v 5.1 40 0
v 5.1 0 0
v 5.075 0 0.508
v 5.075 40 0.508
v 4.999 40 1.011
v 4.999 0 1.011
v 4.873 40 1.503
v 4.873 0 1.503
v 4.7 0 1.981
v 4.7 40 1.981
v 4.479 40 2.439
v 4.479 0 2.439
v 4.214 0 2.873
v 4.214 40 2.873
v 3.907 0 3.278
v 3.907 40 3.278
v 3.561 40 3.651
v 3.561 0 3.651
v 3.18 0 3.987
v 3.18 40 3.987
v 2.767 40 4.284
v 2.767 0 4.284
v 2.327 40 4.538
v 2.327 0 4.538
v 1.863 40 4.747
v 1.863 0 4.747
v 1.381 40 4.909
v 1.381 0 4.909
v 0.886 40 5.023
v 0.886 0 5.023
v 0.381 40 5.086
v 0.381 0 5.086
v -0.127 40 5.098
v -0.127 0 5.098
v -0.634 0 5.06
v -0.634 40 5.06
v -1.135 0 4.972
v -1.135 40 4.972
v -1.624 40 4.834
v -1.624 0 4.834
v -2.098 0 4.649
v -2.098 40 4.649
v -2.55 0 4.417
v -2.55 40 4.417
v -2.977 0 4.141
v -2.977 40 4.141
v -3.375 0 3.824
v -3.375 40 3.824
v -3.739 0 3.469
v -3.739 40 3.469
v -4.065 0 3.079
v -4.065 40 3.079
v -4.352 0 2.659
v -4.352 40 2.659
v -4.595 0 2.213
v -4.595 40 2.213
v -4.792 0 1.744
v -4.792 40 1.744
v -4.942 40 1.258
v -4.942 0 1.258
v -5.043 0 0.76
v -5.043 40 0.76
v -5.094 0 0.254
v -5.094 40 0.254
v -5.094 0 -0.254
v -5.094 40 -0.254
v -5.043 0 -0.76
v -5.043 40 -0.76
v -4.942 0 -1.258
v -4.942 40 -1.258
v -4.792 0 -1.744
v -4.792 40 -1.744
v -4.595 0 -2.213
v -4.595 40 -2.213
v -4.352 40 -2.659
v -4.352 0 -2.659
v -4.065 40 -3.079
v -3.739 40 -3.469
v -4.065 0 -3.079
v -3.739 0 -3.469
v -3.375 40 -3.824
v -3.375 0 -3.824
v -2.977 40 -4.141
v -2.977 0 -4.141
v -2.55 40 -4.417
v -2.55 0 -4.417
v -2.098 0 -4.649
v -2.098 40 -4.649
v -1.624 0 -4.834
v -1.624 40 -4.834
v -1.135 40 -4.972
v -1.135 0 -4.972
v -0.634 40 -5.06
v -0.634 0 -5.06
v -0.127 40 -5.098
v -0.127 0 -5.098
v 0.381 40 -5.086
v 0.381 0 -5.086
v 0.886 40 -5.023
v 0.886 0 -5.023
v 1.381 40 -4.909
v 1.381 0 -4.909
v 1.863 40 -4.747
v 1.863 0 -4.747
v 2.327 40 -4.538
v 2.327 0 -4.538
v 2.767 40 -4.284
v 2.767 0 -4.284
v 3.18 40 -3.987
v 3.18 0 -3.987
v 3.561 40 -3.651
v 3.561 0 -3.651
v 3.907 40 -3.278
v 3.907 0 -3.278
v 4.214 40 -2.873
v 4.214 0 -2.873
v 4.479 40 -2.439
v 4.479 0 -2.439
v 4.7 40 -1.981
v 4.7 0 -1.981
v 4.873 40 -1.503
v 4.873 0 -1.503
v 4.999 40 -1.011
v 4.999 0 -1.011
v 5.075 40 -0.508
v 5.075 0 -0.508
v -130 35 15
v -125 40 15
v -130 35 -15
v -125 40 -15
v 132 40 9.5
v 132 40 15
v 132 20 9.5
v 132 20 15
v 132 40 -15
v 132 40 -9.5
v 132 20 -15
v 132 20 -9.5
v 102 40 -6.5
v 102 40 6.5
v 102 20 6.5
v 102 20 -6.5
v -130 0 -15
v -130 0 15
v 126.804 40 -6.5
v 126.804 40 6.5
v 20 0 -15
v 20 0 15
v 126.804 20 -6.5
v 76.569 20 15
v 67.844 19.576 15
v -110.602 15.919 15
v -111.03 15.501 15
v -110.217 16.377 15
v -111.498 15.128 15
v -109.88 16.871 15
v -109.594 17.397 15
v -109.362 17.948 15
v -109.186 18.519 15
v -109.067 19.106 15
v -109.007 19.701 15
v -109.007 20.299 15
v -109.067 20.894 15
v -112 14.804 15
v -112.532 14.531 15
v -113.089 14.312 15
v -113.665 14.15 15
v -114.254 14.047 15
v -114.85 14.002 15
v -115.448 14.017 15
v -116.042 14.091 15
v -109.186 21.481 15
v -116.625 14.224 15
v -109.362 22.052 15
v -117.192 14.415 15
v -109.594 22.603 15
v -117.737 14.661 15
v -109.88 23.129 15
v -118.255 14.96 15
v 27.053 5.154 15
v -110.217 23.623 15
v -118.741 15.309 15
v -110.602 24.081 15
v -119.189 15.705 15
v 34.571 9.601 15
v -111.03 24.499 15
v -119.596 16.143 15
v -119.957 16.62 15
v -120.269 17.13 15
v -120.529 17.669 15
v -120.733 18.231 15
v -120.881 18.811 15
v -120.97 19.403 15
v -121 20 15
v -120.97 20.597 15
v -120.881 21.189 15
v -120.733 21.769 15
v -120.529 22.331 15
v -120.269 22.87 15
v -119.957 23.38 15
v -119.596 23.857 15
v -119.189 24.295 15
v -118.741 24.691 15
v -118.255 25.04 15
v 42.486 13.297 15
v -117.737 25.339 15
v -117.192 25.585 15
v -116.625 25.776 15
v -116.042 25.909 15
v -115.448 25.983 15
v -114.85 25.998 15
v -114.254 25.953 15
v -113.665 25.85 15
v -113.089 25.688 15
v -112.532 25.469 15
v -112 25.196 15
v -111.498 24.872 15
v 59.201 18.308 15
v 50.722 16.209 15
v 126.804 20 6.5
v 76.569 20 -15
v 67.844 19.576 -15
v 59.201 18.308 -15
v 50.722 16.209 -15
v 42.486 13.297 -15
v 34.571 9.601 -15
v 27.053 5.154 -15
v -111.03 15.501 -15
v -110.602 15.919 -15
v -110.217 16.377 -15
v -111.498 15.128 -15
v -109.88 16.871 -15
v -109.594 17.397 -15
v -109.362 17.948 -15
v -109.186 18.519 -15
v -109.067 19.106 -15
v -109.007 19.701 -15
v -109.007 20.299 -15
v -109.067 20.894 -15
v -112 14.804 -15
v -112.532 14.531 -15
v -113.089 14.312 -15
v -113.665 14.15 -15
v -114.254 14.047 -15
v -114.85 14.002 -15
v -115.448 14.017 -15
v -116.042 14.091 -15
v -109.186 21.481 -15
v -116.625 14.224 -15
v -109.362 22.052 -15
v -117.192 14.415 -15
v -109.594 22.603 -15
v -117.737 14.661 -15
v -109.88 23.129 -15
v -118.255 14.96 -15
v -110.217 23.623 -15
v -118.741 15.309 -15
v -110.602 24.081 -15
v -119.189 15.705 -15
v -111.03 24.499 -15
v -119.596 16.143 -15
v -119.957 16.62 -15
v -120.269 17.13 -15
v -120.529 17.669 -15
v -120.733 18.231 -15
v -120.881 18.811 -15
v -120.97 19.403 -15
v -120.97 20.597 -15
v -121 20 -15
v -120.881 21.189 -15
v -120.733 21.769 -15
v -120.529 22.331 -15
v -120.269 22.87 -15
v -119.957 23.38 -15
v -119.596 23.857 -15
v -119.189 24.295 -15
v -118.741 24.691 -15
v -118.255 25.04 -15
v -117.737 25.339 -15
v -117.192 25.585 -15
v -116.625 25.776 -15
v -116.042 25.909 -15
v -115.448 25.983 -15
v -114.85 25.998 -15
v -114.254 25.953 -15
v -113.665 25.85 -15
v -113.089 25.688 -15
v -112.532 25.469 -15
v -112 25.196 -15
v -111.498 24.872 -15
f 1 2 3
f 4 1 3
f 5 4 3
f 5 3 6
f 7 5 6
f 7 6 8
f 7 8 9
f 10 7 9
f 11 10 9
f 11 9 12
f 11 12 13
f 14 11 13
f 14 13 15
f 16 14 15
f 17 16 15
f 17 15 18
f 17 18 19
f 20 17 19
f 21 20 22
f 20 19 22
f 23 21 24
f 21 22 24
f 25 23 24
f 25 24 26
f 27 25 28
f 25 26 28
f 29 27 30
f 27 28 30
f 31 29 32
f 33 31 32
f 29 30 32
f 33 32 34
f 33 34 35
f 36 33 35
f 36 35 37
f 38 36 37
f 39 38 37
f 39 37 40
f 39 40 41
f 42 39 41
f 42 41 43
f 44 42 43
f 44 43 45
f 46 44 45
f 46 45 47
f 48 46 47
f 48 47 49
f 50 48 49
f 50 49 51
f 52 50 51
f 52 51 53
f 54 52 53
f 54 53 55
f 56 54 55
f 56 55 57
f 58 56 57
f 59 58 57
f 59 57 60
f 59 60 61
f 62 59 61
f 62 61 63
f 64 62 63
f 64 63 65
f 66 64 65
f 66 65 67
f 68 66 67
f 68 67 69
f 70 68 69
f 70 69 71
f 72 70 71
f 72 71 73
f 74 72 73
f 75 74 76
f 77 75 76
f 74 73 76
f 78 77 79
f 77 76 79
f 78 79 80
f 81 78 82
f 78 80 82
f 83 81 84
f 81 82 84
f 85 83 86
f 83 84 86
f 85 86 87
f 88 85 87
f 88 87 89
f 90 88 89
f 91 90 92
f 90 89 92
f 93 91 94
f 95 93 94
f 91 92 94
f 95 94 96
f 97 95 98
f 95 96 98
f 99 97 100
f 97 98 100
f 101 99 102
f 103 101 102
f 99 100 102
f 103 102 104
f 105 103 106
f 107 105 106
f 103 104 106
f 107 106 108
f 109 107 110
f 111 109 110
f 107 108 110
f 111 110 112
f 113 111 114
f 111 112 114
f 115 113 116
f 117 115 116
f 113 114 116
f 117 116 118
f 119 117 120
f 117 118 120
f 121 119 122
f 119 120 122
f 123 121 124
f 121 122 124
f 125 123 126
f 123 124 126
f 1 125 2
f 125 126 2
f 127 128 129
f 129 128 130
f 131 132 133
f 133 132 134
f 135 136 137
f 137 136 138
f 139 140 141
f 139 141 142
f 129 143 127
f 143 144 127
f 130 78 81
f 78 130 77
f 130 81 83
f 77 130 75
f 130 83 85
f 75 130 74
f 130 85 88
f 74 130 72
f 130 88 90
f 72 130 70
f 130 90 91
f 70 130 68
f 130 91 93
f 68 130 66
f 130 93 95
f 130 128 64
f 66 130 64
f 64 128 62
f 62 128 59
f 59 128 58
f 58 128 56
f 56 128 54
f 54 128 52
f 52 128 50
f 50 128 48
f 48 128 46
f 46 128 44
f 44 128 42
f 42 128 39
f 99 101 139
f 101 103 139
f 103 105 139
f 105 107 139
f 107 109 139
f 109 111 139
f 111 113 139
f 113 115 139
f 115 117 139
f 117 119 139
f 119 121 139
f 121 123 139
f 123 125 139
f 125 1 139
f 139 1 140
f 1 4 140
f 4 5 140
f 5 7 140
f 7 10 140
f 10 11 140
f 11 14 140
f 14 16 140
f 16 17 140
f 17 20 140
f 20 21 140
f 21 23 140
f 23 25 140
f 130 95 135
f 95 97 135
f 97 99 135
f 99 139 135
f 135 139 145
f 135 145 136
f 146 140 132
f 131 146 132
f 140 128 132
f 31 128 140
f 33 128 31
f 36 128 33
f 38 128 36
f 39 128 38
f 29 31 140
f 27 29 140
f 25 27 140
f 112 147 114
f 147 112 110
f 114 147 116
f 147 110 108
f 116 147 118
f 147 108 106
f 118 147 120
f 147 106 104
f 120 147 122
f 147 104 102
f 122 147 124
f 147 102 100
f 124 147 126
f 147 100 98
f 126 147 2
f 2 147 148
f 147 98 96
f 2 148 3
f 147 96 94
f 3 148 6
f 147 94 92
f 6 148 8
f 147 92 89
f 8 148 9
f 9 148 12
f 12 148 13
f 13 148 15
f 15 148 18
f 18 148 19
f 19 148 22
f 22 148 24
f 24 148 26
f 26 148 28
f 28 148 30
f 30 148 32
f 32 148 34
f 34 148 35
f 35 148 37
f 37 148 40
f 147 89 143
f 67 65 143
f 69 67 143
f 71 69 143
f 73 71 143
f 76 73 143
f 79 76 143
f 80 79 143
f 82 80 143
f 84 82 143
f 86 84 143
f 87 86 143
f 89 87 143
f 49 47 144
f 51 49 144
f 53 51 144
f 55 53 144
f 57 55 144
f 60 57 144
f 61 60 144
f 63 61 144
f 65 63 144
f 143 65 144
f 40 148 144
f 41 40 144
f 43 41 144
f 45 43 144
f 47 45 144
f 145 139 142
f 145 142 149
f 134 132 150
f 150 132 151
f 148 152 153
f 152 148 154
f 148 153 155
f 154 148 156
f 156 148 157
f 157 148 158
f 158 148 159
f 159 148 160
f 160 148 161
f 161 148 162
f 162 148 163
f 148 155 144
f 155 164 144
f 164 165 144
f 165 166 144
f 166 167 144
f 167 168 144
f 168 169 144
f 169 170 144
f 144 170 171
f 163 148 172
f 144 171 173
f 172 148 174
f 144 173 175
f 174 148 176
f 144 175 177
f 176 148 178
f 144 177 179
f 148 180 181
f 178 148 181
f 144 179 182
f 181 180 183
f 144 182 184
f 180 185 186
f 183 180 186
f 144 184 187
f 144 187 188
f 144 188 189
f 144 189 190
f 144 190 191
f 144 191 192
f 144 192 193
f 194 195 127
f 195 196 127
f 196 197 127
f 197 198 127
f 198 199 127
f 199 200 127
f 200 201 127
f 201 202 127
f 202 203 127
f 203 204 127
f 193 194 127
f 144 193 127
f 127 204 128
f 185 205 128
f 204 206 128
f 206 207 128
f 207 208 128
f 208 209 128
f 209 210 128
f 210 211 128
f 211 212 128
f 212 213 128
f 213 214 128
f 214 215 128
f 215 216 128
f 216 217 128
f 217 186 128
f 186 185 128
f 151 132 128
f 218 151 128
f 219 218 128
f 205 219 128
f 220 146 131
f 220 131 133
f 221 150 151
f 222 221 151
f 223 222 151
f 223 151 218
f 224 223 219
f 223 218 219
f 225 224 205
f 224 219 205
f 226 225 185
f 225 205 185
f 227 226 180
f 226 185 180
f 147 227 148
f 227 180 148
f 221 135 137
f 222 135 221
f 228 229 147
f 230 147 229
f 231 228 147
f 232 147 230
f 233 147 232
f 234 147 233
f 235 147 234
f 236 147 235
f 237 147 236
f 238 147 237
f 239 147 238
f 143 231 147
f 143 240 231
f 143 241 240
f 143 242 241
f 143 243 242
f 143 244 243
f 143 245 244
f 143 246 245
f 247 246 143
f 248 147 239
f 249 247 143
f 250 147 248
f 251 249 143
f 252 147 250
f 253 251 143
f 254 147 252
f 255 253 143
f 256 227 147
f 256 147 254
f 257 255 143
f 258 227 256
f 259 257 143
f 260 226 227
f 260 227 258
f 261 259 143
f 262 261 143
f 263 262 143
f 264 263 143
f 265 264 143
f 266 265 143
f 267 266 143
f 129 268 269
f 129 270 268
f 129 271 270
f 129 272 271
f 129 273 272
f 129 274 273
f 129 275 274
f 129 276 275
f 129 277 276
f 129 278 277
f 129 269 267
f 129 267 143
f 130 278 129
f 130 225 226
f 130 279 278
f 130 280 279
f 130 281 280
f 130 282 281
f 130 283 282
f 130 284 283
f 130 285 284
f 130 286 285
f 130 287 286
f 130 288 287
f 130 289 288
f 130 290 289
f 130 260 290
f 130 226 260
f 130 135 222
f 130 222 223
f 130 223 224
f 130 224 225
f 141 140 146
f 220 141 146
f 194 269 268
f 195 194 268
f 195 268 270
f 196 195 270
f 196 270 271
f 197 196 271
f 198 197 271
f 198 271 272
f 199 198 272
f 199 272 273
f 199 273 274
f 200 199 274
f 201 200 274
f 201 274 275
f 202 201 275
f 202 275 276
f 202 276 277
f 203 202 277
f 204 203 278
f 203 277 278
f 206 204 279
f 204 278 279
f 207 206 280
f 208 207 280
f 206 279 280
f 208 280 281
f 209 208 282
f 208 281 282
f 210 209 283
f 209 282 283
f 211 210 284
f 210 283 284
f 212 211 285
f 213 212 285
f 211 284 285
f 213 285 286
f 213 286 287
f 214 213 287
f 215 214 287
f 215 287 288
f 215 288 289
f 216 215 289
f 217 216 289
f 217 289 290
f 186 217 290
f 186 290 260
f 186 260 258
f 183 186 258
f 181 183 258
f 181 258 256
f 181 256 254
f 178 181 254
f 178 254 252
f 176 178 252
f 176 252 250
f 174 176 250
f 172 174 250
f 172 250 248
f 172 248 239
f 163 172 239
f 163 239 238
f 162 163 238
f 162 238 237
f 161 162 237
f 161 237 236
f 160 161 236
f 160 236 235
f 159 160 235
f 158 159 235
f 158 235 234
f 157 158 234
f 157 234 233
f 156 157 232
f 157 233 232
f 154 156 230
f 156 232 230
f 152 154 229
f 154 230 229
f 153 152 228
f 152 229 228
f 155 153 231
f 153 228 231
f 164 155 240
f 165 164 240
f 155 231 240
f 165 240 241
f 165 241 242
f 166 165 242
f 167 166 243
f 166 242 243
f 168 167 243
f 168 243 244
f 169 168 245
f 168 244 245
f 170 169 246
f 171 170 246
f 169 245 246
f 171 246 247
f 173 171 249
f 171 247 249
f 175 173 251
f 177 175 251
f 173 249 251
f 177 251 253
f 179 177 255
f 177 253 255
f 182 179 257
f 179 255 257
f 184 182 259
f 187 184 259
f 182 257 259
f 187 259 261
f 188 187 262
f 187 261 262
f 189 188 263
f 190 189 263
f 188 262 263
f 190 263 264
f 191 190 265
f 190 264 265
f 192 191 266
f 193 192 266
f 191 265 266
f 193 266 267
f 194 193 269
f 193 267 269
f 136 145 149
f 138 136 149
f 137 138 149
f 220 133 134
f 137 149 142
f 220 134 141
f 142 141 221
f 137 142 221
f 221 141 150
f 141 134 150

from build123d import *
from OCP.BRepFilletAPI import BRepFilletAPI_MakeChamfer

# Parameters (mm, degrees)
MAIN_BODY_DEPTH            = 15
F_12_0_12_DIAMETER_HOLE1_D = 12
M12X1_75_TAPPED_HOLE2_D    = 10.2
SKETCH4_W                  = 30
SKETCH4_H                  = 13
CUT_OUT_DEPTH              = 139.740765458
C_FER_5_X_45_SIZE          = 5
C_FER_3_X_30_SIZE          = 3
C_FER_3_X_30_SIZE2         = 5.196152423


with BuildPart() as part:
    # Sketch1 → main body (new, symmetric)
    with BuildSketch(Plane.XY):
        with BuildLine():
            Line((20, 0), (-130, 0))
            Line((-130, 0), (-130, 40))
            Line((-130, 40), (132, 40))
            Line((132, 40), (132, 20))
            Line((132, 20), (76.568542495, 20))
            ThreePointArc((76.568542495, 20), (46.568542495, 14.852813742), (20, 0))
        make_face()
    extrude(amount=MAIN_BODY_DEPTH, both=True)

    # Ø12.0 (12) Diameter Hole1 (through all)
    with Locations(Plane(origin=(-115, 20, 15), x_dir=(1, 0, 0), z_dir=(0, 0, 1))):
        with Locations((0, 0)):
            Hole(F_12_0_12_DIAMETER_HOLE1_D / 2)

    # M12x1.75 Tapped Hole2 (through all)
    with Locations(Plane(origin=(0, 40, 0), x_dir=(-1, 0, 0), z_dir=(0, 1, 0))):
        with Locations((0, 0)):
            Hole(M12X1_75_TAPPED_HOLE2_D / 2)

    # Sketch4 → cut out (cut, through all)
    with BuildSketch(Plane(origin=(0, 40, 0), x_dir=(1, 0, 0), z_dir=(0, 1, 0))):
        with Locations((117, 0)):
            Rectangle(SKETCH4_W, SKETCH4_H)
    extrude(amount=-CUT_OUT_DEPTH, mode=Mode.SUBTRACT)

    # C'FER 5 x 45
    c_fer_5_x_45_edges = [part.edges().sort_by_distance(p)[0] for p in [
        (-130, 40, 0),
    ]]
    chamfer(c_fer_5_x_45_edges, length=C_FER_5_X_45_SIZE)

    # C'FER 3 x 30: one chamfer whose edges measure the first distance from different faces: ONE call of the kernel's chamfer builder (chamfer() names one face for all edges)
    c_fer_3_x_30_edges_1 = [part.edges().sort_by_distance(p)[0] for p in [
        (132, 30, -6.5),
    ]]
    c_fer_3_x_30_side_1 = [part.faces().sort_by_distance(p)[0] for p in [
        (132, 30, -10.75),
    ]]
    c_fer_3_x_30_edges_2 = [part.edges().sort_by_distance(p)[0] for p in [
        (132, 30, 6.5),
    ]]
    c_fer_3_x_30_side_2 = [part.faces().sort_by_distance(p)[0] for p in [
        (132, 30, 10.75),
    ]]
    c_fer_3_x_30 = BRepFilletAPI_MakeChamfer(part.part.solid().wrapped)
    for e in c_fer_3_x_30_edges_1:
        c_fer_3_x_30.Add(C_FER_3_X_30_SIZE, C_FER_3_X_30_SIZE2, e.wrapped, c_fer_3_x_30_side_1[0].wrapped)  # the first distance lies on this face
    for e in c_fer_3_x_30_edges_2:
        c_fer_3_x_30.Add(C_FER_3_X_30_SIZE, C_FER_3_X_30_SIZE2, e.wrapped, c_fer_3_x_30_side_2[0].wrapped)  # the first distance lies on this face
    add(Compound.cast(c_fer_3_x_30.Shape()), mode=Mode.REPLACE)


solid = part.part
